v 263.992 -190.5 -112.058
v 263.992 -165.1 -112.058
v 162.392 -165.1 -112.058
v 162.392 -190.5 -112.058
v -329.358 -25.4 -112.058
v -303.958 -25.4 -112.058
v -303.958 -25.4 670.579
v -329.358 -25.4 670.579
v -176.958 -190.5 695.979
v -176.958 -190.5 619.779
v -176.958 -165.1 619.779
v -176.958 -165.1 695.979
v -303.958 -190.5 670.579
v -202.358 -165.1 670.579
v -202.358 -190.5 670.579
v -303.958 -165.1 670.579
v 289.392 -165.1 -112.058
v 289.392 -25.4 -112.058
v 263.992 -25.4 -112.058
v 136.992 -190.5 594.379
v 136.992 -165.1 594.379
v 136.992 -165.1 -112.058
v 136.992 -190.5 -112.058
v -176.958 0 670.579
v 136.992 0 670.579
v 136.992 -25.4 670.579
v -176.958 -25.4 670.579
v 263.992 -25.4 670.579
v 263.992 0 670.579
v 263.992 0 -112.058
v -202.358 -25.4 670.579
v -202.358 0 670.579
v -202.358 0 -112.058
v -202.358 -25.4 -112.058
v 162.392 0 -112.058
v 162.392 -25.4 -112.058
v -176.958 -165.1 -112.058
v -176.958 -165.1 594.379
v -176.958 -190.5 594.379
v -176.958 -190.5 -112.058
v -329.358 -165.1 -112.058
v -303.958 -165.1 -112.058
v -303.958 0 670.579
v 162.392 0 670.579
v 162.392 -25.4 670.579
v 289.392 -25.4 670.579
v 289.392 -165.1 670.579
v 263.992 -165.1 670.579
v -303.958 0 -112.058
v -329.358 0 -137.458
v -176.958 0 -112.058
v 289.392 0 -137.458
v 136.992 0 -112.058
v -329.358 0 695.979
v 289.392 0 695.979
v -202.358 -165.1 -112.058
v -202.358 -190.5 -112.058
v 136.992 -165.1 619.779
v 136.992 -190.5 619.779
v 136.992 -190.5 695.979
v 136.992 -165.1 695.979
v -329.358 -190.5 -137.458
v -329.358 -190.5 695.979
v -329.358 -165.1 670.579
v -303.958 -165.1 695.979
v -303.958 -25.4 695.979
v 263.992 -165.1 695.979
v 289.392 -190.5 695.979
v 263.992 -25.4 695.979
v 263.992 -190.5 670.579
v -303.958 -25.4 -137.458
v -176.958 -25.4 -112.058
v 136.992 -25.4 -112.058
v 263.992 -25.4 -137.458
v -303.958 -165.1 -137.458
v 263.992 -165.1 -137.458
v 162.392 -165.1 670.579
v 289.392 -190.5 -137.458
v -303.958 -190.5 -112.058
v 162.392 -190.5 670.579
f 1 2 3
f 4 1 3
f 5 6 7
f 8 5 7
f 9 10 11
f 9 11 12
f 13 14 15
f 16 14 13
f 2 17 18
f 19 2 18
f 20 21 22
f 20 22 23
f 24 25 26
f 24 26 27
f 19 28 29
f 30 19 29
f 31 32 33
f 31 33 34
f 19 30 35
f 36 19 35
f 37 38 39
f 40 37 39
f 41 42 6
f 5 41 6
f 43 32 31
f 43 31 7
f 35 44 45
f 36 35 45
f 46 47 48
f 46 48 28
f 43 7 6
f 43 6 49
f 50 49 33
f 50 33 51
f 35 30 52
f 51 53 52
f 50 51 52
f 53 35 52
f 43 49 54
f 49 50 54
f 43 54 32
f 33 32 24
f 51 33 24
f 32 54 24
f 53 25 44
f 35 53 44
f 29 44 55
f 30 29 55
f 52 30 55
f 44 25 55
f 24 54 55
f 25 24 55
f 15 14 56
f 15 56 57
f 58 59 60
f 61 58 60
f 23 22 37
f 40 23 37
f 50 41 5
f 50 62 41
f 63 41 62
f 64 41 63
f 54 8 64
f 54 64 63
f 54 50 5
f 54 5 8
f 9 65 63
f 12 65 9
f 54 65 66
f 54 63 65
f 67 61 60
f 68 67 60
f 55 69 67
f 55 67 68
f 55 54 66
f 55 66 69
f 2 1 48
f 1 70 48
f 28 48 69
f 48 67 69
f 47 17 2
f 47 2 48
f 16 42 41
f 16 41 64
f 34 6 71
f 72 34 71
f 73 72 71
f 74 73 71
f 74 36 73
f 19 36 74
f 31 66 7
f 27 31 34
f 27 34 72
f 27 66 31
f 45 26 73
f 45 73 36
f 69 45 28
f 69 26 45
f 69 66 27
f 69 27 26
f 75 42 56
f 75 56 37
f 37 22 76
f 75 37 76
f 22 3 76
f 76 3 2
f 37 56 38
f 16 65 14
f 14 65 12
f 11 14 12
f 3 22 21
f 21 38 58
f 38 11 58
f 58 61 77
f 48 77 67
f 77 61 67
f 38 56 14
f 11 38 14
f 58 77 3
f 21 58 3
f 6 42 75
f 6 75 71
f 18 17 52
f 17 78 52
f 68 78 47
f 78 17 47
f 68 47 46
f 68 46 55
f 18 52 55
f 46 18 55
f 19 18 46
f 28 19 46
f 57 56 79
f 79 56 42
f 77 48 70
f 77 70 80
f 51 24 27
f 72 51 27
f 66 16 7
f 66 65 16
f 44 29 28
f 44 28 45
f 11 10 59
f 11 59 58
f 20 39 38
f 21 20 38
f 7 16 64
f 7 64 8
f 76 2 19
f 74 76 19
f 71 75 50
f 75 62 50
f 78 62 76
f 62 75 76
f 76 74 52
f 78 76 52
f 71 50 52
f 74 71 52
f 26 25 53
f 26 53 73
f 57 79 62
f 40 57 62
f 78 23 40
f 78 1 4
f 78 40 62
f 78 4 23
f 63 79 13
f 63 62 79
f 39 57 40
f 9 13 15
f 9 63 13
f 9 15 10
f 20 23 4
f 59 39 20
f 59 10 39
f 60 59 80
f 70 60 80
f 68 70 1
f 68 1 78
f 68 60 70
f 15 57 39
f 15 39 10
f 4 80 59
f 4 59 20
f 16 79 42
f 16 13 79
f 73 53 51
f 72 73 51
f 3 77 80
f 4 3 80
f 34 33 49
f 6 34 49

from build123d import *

# Parameters (mm, degrees)
F0_W      = 618.75
F0_H      = 833.4375
F1_DEPTH  = 190.5
F2_W      = 567.95
F2_H      = 139.7
F3_DEPTH  = 833.4385
F4_W      = 567.95
F4_H      = 782.6375
F5_DEPTH  = 190.501
F6_W      = 139.7
F6_H      = 782.6375
F7_DEPTH  = 618.751
F8_W      = 25.4
F8_H      = 25.4
F9_DEPTH  = 787.4
F10_W     = 25.4
F10_H     = 25.4
F11_DEPTH = 787.4
F12_W     = 25.4
F12_H     = 25.4
F13_DEPTH = 787.4
F14_W     = 25.4
F14_H     = 25.4
F15_DEPTH = 787.4
F16_W     = 25.4
F16_H     = 25.4
F17_DEPTH = 313.95
F18_W     = 313.95
F18_H     = 25.4
F19_DEPTH = 25.4


with BuildPart() as f1:
    # F0 (on Front) → F1 (new body)
    with BuildSketch(Plane.XZ):
        with Locations((-19.982701, 279.260447)):
            Rectangle(F0_W, F0_H)
    extrude(amount=F1_DEPTH)

    # F2 (on face) → F3 (cut, through all)
    with BuildSketch(Plane.XY.offset(695.979197)):
        with Locations((-19.982701, -95.25)):
            Rectangle(F2_W, F2_H)
    extrude(amount=-F3_DEPTH, mode=Mode.SUBTRACT)

    # F4 (on face) → F5 (cut, through all)
    with BuildSketch(Plane(origin=(0, 0, 0), x_dir=(-1, 0, 0), z_dir=(0, 1, 0))):
        with Locations((19.982701, 279.260447)):
            Rectangle(F4_W, F4_H)
    extrude(amount=-F5_DEPTH, mode=Mode.SUBTRACT)

    # F6 (on face) → F7 (cut, through all)
    with BuildSketch(Plane.YZ.offset(289.392299)):
        with Locations((-95.25, 279.260447)):
            Rectangle(F6_W, F6_H)
    extrude(amount=-F7_DEPTH, mode=Mode.SUBTRACT)

    # F8 (on face) → F9 (join)
    with BuildSketch(Plane(origin=(0, 0, 670.579197), x_dir=(1, 0, 0), z_dir=(0, 0, -1))):
        with Locations((149.692299, 177.8)):
            Rectangle(F8_W, F8_H)
    extrude(amount=F9_DEPTH)

    # F10 (on face) → F11 (join)
    with BuildSketch(Plane(origin=(0, 0, 670.579197), x_dir=(1, 0, 0), z_dir=(0, 0, -1))):
        with Locations((-189.657701, 177.8)):
            Rectangle(F10_W, F10_H)
    extrude(amount=F11_DEPTH)

    # F12 (on face) → F13 (join)
    with BuildSketch(Plane(origin=(0, 0, 670.579197), x_dir=(1, 0, 0), z_dir=(0, 0, -1))):
        with Locations((-189.657701, 12.7)):
            Rectangle(F12_W, F12_H)
    extrude(amount=F13_DEPTH)

    # F14 (on face) → F15 (join)
    with BuildSketch(Plane(origin=(0, 0, 670.579197), x_dir=(1, 0, 0), z_dir=(0, 0, -1))):
        with Locations((149.692299, 12.7)):
            Rectangle(F14_W, F14_H)
    extrude(amount=F15_DEPTH)

    # F16 (on face) → F17 (join, through all)
    with BuildSketch(Plane.YZ.offset(-176.957701)):
        with Locations((-177.8, 607.079197)):
            Rectangle(F16_W, F16_H)
    extrude(amount=F17_DEPTH)

    # F18 (on face) → F19 (cut, through all)
    with BuildSketch(Plane.XZ.offset(190.5)):
        with Locations((-19.982701, 683.279197)):
            Rectangle(F18_W, F18_H)
    extrude(amount=-F19_DEPTH, mode=Mode.SUBTRACT)


solid = f1.part
